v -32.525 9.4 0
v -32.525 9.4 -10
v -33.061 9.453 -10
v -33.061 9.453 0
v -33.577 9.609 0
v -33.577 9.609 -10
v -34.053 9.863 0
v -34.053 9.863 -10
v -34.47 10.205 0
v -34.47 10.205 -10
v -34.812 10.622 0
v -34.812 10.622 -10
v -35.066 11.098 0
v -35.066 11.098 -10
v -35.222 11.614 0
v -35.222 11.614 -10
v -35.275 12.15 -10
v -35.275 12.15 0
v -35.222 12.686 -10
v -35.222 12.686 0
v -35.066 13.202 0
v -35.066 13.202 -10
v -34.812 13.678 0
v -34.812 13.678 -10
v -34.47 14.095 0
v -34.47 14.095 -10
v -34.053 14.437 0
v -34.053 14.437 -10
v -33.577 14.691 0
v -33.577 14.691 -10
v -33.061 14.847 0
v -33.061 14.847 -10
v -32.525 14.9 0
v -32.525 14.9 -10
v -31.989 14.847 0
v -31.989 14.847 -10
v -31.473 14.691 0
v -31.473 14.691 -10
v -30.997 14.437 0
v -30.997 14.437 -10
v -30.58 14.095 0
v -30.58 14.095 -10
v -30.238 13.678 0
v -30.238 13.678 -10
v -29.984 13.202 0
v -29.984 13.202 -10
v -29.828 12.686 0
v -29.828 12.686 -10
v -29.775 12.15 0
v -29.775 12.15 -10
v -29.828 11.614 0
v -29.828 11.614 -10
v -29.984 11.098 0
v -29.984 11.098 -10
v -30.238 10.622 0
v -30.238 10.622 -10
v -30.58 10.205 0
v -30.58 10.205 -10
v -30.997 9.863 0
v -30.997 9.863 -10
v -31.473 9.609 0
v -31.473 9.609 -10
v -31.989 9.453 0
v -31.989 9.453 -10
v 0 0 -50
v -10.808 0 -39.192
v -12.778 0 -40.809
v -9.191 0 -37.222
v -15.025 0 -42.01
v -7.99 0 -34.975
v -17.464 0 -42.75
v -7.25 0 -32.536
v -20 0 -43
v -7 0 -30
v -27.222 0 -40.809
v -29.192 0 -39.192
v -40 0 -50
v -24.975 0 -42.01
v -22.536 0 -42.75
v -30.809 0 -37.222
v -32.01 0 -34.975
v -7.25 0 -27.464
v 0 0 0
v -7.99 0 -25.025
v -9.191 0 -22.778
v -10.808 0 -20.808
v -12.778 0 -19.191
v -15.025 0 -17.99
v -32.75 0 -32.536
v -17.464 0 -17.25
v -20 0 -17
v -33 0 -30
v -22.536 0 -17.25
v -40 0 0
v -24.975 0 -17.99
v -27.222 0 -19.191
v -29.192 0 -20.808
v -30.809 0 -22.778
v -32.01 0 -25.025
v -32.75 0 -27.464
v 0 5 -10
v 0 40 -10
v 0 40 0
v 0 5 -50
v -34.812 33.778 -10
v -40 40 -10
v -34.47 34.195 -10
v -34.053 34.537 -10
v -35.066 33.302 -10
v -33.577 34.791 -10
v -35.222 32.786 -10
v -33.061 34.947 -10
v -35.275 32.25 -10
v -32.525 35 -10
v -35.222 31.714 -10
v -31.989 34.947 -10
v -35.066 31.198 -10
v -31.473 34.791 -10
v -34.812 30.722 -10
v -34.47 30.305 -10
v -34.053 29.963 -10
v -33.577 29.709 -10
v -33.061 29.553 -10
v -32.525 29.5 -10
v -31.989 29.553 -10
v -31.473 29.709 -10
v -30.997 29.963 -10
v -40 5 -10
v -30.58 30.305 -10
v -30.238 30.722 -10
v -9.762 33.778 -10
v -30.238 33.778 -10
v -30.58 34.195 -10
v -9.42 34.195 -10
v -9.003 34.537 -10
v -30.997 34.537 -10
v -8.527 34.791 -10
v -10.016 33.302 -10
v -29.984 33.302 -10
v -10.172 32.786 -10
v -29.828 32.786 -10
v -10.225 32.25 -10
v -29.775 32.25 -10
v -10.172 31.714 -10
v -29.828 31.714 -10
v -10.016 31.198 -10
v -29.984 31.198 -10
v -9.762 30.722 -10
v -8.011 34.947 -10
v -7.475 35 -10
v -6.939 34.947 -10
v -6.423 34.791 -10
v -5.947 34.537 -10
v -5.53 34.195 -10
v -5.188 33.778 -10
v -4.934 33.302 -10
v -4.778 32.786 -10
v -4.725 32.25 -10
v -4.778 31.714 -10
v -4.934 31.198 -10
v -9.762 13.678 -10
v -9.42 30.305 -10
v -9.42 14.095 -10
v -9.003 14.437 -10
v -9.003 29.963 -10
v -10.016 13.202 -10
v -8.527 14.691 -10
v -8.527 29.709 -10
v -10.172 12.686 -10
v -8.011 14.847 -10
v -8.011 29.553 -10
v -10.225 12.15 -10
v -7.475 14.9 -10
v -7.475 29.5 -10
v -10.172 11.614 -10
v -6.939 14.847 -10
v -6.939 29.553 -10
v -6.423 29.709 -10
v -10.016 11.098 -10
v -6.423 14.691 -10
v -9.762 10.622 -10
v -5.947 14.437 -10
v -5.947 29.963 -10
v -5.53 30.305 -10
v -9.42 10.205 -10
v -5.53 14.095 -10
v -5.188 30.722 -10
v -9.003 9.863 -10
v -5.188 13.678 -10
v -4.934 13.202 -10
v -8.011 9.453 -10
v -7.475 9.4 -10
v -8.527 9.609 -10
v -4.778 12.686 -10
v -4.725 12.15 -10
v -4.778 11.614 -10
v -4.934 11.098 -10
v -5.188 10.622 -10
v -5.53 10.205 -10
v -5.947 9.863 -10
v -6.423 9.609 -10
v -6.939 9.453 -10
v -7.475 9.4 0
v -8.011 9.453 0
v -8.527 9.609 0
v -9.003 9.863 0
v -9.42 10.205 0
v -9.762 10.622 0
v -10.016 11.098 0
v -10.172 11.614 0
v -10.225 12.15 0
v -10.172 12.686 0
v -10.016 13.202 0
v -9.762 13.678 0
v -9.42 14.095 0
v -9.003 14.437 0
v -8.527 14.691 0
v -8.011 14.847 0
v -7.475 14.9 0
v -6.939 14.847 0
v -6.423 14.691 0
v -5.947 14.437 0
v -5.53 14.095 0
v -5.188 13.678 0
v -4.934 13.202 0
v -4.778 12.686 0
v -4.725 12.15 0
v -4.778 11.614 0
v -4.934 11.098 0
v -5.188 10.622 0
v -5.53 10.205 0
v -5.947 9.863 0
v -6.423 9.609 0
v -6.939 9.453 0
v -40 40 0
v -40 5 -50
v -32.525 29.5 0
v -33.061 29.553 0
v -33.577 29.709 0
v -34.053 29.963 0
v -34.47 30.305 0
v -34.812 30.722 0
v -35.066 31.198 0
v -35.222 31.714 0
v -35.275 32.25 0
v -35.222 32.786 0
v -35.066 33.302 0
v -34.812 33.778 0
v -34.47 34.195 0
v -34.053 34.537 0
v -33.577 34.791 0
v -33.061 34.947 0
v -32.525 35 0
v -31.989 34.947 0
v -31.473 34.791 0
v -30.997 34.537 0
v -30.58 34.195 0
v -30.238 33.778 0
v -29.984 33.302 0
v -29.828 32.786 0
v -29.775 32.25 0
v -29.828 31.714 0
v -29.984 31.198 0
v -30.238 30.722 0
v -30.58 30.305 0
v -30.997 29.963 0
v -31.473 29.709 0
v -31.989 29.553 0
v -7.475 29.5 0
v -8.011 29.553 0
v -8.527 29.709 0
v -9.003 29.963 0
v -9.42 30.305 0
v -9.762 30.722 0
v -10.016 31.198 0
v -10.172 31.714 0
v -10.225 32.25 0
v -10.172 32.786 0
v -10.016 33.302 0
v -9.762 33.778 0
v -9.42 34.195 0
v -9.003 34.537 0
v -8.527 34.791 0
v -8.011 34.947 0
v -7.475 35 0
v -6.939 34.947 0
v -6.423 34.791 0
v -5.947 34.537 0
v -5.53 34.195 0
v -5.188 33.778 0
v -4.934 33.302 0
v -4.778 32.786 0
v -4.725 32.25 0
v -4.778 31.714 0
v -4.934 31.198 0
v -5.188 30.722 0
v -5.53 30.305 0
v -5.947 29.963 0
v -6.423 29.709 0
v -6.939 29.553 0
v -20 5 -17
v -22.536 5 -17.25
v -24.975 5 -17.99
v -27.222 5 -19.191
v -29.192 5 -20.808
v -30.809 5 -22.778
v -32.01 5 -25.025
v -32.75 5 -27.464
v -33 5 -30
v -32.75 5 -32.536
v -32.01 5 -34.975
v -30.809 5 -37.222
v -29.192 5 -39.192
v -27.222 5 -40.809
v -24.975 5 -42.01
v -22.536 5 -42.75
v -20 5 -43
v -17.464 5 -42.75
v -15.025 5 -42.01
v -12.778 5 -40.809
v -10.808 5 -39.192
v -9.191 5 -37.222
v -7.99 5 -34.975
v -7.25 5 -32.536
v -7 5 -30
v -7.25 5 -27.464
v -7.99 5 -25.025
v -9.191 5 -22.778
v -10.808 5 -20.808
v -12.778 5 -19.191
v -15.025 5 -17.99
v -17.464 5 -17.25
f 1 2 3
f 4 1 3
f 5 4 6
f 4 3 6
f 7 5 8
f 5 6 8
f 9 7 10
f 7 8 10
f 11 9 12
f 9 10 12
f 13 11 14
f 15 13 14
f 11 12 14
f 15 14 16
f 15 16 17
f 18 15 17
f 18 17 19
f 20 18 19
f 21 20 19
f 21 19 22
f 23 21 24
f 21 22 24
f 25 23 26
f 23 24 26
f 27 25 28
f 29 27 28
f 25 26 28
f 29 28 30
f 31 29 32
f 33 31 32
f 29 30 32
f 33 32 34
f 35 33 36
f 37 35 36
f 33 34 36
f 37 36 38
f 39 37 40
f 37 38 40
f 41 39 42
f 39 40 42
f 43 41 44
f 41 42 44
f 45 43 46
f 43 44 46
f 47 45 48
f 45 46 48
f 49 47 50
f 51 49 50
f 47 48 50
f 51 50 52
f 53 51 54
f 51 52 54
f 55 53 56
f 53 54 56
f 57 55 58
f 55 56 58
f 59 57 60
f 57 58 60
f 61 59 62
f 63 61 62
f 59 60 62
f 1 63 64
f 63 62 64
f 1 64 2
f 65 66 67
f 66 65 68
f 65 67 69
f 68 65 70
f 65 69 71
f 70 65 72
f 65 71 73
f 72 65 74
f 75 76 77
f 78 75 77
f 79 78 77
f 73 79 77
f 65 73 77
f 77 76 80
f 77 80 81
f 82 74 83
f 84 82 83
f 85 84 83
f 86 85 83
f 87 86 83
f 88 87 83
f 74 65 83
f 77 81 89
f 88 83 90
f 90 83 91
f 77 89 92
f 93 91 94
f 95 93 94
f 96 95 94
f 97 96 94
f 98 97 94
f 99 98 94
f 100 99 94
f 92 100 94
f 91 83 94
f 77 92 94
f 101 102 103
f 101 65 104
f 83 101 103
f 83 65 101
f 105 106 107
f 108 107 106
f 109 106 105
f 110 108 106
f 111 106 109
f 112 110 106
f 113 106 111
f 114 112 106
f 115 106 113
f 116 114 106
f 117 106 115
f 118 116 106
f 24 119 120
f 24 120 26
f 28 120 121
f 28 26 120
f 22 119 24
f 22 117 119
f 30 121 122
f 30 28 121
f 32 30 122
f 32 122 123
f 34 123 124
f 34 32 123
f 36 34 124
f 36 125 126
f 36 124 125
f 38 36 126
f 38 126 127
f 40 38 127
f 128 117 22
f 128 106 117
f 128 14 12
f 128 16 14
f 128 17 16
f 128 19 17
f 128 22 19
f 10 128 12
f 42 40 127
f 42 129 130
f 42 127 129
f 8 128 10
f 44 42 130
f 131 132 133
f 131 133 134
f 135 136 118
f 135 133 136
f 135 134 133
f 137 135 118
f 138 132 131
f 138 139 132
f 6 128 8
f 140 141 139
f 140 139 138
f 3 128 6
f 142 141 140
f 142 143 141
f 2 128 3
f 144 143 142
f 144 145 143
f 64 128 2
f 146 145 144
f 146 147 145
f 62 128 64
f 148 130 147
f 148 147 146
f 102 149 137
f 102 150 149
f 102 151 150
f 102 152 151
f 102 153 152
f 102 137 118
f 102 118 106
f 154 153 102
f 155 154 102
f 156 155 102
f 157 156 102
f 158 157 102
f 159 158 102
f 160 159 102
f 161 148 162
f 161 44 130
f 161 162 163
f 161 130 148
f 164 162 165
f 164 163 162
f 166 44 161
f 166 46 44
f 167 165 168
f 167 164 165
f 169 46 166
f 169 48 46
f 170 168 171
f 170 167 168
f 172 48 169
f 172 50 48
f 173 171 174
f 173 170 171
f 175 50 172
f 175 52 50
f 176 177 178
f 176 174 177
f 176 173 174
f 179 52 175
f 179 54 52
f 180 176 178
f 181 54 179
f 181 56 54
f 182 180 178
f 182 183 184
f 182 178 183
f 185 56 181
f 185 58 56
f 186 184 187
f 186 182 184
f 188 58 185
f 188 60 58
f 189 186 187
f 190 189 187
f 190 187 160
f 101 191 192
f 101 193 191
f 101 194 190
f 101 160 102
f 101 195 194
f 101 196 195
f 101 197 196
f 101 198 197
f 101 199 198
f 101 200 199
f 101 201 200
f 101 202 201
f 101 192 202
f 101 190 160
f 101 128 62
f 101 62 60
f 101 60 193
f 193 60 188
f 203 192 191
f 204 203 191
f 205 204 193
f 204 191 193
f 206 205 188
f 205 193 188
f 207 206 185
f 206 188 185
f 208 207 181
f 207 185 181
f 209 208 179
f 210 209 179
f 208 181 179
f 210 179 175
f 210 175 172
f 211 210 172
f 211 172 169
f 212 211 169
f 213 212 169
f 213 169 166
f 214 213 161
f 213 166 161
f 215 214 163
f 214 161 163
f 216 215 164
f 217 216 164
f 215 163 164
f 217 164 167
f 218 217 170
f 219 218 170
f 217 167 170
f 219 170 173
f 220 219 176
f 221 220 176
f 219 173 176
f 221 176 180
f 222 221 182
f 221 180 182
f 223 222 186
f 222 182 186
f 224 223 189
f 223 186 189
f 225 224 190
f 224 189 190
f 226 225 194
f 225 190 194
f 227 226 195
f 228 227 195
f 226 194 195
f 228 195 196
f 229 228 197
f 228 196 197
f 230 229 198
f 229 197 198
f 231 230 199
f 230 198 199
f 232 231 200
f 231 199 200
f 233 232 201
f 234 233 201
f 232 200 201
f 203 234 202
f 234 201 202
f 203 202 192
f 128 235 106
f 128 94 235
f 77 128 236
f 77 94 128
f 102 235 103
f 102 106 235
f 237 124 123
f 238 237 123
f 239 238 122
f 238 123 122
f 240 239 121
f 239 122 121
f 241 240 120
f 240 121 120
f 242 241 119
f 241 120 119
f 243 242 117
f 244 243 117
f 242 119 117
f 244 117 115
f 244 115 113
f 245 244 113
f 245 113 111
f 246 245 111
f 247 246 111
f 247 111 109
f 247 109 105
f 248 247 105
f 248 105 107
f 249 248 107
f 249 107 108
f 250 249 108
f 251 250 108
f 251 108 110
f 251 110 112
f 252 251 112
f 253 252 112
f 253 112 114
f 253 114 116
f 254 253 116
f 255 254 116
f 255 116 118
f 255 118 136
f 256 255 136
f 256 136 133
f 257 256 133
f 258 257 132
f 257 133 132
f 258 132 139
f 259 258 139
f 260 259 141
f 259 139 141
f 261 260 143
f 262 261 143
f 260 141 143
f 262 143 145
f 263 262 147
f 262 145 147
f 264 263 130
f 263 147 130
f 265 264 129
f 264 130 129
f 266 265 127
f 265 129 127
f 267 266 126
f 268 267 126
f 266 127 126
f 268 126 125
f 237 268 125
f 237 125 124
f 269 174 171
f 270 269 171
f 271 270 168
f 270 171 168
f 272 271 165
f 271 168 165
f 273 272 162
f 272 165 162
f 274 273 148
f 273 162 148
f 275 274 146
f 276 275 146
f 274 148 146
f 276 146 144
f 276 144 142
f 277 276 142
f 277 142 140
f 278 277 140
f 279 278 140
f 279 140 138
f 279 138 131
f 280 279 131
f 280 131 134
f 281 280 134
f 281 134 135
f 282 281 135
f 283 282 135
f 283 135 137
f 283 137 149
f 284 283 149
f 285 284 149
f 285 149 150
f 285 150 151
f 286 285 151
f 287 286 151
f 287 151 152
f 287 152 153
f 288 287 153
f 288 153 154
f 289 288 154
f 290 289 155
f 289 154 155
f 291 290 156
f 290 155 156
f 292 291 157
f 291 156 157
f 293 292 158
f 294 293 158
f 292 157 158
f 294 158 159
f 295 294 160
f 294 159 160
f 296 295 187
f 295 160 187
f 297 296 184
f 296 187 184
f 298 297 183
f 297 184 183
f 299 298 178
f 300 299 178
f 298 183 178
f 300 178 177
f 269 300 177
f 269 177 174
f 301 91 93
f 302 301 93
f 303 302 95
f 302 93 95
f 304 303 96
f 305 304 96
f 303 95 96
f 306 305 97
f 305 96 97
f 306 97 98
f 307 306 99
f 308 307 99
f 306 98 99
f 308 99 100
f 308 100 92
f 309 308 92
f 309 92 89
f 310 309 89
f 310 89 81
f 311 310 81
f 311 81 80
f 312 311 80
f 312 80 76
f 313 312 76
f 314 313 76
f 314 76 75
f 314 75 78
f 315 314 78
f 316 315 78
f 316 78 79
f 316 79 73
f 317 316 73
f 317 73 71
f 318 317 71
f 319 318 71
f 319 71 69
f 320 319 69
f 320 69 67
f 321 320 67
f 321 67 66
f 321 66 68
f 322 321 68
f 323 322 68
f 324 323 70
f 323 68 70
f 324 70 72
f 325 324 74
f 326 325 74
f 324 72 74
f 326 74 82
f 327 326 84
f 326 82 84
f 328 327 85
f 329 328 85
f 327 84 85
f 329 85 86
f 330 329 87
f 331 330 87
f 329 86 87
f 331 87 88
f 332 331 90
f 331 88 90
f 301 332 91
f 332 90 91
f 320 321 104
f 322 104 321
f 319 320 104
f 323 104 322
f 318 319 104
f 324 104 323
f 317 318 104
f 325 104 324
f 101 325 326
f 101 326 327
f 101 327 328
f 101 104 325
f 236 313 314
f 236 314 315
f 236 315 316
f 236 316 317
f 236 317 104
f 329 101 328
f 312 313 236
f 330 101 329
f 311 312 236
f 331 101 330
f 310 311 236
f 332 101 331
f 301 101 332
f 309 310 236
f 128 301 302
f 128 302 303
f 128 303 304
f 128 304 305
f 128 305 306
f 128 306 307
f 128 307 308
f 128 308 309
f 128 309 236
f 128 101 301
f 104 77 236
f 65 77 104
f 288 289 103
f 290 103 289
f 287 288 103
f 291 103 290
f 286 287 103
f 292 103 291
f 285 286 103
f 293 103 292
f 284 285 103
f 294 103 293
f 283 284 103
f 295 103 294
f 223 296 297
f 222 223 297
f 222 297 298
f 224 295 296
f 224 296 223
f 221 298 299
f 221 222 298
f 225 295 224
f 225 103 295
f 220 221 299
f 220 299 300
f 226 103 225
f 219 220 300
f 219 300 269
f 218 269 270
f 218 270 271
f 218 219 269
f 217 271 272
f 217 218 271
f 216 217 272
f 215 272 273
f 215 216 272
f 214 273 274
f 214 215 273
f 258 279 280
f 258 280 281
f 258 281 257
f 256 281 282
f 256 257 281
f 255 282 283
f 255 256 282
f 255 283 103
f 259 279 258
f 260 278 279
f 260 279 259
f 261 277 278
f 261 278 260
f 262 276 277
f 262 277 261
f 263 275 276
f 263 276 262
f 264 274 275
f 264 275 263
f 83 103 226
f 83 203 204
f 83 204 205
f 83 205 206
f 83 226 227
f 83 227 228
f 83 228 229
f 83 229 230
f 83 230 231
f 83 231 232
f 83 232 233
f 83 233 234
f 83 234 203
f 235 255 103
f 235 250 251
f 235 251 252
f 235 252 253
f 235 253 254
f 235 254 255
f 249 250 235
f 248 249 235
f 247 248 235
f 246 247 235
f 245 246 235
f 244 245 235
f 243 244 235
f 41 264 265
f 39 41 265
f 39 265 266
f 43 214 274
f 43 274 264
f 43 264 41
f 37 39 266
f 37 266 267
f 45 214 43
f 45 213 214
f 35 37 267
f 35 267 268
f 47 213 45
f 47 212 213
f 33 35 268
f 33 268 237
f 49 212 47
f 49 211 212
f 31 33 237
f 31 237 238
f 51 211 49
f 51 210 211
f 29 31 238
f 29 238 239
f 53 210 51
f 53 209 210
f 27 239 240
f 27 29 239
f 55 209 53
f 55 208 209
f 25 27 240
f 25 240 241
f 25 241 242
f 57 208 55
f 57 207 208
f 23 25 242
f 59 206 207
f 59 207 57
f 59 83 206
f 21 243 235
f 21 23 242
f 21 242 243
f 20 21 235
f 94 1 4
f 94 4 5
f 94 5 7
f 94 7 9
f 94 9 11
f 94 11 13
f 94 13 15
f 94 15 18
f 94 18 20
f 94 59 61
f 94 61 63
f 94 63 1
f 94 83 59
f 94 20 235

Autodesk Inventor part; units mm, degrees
ref_plane "YZ Plane" through (0, 0, 0) normal (1, 0, 0) x (0, 1, 0)
ref_plane "XZ Plane" through (0, 0, 0) normal (0, 1, 0) x (-1, 0, 0)
ref_plane "XY Plane" through (0, 0, 0) normal (0, 0, 1) x (1, 0, 0)
sketch "Esboço1" plane through (0, 0, 0) normal (0, 1, 0) x (-1, 0, 0)
  line L0 (0, 0) -> (40, 0)
  line L1 (40, 0) -> (40, -50)
  line L2 (40, -50) -> (0, -50)
  line L3 (0, -50) -> (0, 0)
  dimension "d0" = 40
  dimension "d1" = 50
extrude "Extrusão1" add sketch "Esboço1" along normal blind 5
sketch "Esboço2" plane through (0, 5, 0) normal (0, 1, 0) x (1, 0, 0)
  line L0 (-40, 50) -> (-40, 0) projected
  line L1 (0, 0) -> (-40, 0)
  line L2 (-40, 0) -> (-40, 10)
  line L3 (-40, 10) -> (0, 10)
  line L4 (0, 10) -> (0, 0)
  point P0 (-40, 0)
  dimension "d4" = 10
extrude "Extrusão2" add sketch "Esboço2" along normal blind 35
sketch "Esboço3" plane through (0, 5, 0) normal (0, 1, 0) x (1, 0, 0)
  line L0 (-40, 50) -> (-40, 10) projected
  line L1 (0, 50) -> (-40, 50) projected
  point P0 (0, 0)
  point P1 (-20, 30)
  dimension "d7" = 40
  dimension "d8" = 40
  dimension "d9" = 20
  dimension "d10" = 20
hole "Furo1" at (-20, 5, -30) direction (0, -1, 0) diameter 26 end through all
sketch "Sketch4" plane through (-40, 0, 0) normal (0, 0, 1) x (1, 0, 0)
  line L0 (0, 0) -> (0, 40) projected
  line L1 (0, 40) -> (40, 40) projected
  point P0 (40, 0)
  point P1 (7.475, 12.15)
  point P2 (7.475, 32.25)
  point P3 (32.525, 12.15)
  point P4 (32.525, 32.25)
  dimension "d20" = 20.1
  dimension "d23" = 25.05
  dimension "d26" = 7.75
  dimension "d27" = 40
  dimension "d28" = 7.475
hole "Hole2" at (-32.525, 12.15, 0) at (-32.525, 32.25, 0) at (-7.475, 12.15, 0) at (-7.475, 32.25, 0) direction (0, 0, -1) diameter 5.5 end through all
equation "\"d9\" = 0.5 * d8"
equation "\"d10\" = 0.5 * d7"
equation "\"d16\" = Espessura"
equation "\"d28\" = -0.5 * d23 + 0.5 * d27"
equation "\"d34\" = Espessura"
equation "\"Raio_vergadura\" = Espessura"
equation "\"Largura_alívio_de_vergadura\" = Espessura"
equation "\"Profundidade_alívio_de_vergadura\" = 0.5 * Espessura"
equation "\"Tamanho_alívio_de_dobra\" = 4 * Espessura"
equation "\"Remanescente_mínimo\" = 2 * Espessura"
equation "\"Raiodetransição\" = Raio_vergadura"
equation "\"Tamanho_de_raio_de_Jacobi\" = Raio_vergadura"
equation "\"TamanhoFolga\" = Espessura"
equation "\"Espessura\" = 0.5"
properties part number "Suporte da guia do eixo" material "Alumínio 6061"
